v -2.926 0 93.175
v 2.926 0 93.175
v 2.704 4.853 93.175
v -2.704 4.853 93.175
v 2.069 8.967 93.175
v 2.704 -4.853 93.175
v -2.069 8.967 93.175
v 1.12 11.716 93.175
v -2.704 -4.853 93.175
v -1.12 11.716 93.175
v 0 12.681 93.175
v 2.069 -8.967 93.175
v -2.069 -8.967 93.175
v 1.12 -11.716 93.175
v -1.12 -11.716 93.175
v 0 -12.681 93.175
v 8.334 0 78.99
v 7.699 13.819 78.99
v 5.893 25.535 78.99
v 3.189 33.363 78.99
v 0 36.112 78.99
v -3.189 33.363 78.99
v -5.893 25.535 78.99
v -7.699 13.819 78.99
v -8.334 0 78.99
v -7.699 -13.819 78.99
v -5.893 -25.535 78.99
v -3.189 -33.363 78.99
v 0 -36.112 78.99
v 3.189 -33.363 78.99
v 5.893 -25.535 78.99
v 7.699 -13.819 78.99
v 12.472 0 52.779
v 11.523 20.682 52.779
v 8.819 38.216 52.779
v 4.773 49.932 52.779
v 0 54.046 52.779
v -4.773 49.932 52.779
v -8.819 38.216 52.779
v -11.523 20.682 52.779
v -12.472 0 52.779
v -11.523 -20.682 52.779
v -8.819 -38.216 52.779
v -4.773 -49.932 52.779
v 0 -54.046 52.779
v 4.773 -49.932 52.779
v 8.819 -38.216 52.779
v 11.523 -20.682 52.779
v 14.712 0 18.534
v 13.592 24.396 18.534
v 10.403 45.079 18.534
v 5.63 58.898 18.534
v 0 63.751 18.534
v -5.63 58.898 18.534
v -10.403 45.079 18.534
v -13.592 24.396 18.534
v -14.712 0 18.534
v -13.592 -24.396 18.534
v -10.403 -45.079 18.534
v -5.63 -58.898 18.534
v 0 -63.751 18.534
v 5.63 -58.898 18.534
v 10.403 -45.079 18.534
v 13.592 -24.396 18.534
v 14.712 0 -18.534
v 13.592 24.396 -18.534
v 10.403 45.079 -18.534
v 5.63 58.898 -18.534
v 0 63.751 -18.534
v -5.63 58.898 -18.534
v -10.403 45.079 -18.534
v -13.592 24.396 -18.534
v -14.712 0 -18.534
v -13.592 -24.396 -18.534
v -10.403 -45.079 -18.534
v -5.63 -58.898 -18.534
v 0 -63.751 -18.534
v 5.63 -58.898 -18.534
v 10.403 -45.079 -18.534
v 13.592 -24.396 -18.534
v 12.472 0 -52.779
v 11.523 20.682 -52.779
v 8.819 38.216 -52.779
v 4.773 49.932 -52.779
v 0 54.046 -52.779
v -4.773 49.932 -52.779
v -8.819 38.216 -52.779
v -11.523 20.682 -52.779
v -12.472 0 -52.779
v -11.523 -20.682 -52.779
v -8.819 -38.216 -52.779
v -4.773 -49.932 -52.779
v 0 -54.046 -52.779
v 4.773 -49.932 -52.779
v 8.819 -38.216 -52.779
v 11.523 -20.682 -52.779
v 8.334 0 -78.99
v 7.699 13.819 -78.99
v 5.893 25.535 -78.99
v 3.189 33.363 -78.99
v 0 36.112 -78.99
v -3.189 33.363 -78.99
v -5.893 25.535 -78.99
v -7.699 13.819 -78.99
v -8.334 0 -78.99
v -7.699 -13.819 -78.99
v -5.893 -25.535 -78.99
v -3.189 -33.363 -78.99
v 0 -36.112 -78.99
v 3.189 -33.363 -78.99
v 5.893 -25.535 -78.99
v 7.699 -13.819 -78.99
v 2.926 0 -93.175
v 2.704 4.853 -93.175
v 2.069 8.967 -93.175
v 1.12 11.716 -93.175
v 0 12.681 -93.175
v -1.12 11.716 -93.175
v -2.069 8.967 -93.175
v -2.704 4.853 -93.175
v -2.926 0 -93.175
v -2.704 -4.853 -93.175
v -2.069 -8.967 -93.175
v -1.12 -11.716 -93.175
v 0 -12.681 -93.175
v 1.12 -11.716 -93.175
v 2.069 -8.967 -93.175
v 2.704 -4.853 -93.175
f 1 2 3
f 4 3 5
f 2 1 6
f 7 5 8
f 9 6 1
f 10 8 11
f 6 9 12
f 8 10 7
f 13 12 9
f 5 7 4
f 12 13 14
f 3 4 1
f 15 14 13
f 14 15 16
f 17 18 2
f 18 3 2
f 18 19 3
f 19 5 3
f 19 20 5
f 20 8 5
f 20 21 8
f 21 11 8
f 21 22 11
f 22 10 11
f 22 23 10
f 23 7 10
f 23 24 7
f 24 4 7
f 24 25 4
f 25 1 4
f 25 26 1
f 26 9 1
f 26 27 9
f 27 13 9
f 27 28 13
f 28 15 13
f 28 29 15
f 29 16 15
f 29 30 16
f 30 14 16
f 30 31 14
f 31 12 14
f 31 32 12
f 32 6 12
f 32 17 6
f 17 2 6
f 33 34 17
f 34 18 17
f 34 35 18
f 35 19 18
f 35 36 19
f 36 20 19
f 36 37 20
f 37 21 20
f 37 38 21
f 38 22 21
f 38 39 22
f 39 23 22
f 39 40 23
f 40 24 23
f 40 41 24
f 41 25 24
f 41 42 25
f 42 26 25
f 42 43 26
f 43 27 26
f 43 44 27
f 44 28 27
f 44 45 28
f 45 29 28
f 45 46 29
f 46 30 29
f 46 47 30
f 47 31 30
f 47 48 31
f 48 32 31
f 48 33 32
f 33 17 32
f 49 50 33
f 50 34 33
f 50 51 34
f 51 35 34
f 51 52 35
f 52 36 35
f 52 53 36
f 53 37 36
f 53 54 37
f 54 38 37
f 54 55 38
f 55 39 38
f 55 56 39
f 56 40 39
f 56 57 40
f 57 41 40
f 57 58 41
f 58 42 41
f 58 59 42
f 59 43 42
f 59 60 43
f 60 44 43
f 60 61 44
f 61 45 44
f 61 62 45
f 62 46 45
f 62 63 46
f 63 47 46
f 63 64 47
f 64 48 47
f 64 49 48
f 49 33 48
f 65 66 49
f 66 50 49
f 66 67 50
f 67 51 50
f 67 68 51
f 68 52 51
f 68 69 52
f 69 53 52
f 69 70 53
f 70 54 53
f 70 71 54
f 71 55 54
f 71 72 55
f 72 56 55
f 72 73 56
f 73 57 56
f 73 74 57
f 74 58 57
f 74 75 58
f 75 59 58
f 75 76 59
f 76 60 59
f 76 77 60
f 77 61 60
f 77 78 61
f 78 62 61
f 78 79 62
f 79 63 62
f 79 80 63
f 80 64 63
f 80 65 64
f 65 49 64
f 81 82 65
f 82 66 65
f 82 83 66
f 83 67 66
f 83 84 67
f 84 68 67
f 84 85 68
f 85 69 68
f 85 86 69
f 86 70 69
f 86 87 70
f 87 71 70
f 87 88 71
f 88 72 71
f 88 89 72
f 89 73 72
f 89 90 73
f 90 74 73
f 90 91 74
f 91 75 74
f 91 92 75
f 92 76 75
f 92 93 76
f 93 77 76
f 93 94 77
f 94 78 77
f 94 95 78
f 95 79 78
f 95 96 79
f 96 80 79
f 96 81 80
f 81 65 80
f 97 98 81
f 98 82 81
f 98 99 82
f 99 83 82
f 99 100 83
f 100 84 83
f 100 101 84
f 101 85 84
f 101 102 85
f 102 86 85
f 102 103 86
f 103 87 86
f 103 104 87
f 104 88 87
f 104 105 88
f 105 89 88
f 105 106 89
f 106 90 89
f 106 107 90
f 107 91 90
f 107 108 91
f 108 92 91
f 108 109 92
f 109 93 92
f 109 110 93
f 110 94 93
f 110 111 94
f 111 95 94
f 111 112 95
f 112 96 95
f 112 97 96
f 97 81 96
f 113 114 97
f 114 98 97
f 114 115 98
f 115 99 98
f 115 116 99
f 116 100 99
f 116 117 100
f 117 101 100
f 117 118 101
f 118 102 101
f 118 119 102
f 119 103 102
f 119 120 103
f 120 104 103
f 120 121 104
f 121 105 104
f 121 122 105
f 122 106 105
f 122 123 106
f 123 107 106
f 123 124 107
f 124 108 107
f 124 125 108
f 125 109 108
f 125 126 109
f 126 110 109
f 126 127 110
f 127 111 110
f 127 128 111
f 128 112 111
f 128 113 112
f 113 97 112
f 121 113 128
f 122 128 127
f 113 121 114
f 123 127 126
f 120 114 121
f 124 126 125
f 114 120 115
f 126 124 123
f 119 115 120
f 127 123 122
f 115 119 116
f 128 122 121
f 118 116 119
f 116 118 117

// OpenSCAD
// Generated by SolidPython 1.0.1 on 2020-07-29 00:46:45


scale(v = [3, 13, 19]) {
	sphere(r = 5);
}
/***********************************************
*********      SolidPython code:      **********
************************************************
 
# import packages: SolidPython
from solid import *
from solid.utils import *
from itertools import chain, combinations, permutations


class Resize:

    def __init__(self, scad_file):
        self.scad_file = scad_file
        #self.scad_file = import_scad(scad_file)
        # cone/cylinder param:
        self.r1 = 0
        self.r2 = 0
        self.h = 0
        # rectangular prism param:
        self.w = 0
        self.l = 0
        # ellipse param:
        self.r = 0

    # import OpenScad code (file name corresponds to shape)


    # classify shape + parameters
    def assign(self, param1, param2, param3):
        if self.scad_file == 'cone.scad':
            self.r1 = param1
            self.r2 = param2
            self.h = param3
        elif self.scad_file == 'cylinder.scad':
            self.r1 = param1
            self.r2 = param2
            self.h = param3
        elif self.scad_file == 'rectangularPrism.scad':
            self.h = param1
            self.l = param2
            self.w = param3
        else:
            self.r = param1
            self.h = param2

    # resize parameters
    def iterate(self):
        x = range(3, 20, 2)
        i = 1
        if self.scad_file == 'cone.scad':
            tempList = list(permutations(x, 2))
            for temp in tempList:
                param1 = temp[0]
                param2 = temp[1]
                filepath = 'produced_scad_files/' + 'cone' + str(param1) + '_' + str(param2) + '_' + '.scad'
                scad_render_to_file(cylinder(h=param1, r1=param2, r2=0), filepath)

        elif self.scad_file == 'cylinder.scad':
            tempList = list(permutations(x, 3))
            for temp in tempList:
                param1 = temp[0]
                param2 = temp[1]
                filepath = 'produced_scad_files/' + 'cylinder' + str(param1) + '_' + str(param2) + '_' + '.scad'
                scad_render_to_file(cylinder(h=param1, r1=param2, r2=param2), filepath)

        elif self.scad_file == 'rectangularPrism.scad':
            tempList = list(permutations(x, 3))
            for temp in tempList:
                param1 = temp[0]
                param2 = temp[1]
                param3 = temp[2]
                filepath = 'produced_scad_files/' + 'rectangularPrism' + str(param1) + '_' + str(param2) + '_' + str(
                    param3) + '.scad'
                scad_render_to_file(cube(size=(param1, param2, param3)), filepath)

        elif self.scad_file == 'ellipse.scad':
            tempList = list(permutations(x, 4))
            for temp in tempList:
                param1 = temp[0]
                param2 = temp[1]
                param3 = temp[2]
                param4 = temp[3]
                filepath = 'produced_scad_files/' + 'ellipse' + str(param1) + '_' + str(param2) + '_' + str(param3) + '_' + str(param4) + '.scad'
                scad_render_to_file(scale([param1, param2, param3])(sphere(r=param4)), filepath)

    def render_to_scadfile(self):
        scad_render_to_file(scad, 'example.scad') 
 
************************************************/
